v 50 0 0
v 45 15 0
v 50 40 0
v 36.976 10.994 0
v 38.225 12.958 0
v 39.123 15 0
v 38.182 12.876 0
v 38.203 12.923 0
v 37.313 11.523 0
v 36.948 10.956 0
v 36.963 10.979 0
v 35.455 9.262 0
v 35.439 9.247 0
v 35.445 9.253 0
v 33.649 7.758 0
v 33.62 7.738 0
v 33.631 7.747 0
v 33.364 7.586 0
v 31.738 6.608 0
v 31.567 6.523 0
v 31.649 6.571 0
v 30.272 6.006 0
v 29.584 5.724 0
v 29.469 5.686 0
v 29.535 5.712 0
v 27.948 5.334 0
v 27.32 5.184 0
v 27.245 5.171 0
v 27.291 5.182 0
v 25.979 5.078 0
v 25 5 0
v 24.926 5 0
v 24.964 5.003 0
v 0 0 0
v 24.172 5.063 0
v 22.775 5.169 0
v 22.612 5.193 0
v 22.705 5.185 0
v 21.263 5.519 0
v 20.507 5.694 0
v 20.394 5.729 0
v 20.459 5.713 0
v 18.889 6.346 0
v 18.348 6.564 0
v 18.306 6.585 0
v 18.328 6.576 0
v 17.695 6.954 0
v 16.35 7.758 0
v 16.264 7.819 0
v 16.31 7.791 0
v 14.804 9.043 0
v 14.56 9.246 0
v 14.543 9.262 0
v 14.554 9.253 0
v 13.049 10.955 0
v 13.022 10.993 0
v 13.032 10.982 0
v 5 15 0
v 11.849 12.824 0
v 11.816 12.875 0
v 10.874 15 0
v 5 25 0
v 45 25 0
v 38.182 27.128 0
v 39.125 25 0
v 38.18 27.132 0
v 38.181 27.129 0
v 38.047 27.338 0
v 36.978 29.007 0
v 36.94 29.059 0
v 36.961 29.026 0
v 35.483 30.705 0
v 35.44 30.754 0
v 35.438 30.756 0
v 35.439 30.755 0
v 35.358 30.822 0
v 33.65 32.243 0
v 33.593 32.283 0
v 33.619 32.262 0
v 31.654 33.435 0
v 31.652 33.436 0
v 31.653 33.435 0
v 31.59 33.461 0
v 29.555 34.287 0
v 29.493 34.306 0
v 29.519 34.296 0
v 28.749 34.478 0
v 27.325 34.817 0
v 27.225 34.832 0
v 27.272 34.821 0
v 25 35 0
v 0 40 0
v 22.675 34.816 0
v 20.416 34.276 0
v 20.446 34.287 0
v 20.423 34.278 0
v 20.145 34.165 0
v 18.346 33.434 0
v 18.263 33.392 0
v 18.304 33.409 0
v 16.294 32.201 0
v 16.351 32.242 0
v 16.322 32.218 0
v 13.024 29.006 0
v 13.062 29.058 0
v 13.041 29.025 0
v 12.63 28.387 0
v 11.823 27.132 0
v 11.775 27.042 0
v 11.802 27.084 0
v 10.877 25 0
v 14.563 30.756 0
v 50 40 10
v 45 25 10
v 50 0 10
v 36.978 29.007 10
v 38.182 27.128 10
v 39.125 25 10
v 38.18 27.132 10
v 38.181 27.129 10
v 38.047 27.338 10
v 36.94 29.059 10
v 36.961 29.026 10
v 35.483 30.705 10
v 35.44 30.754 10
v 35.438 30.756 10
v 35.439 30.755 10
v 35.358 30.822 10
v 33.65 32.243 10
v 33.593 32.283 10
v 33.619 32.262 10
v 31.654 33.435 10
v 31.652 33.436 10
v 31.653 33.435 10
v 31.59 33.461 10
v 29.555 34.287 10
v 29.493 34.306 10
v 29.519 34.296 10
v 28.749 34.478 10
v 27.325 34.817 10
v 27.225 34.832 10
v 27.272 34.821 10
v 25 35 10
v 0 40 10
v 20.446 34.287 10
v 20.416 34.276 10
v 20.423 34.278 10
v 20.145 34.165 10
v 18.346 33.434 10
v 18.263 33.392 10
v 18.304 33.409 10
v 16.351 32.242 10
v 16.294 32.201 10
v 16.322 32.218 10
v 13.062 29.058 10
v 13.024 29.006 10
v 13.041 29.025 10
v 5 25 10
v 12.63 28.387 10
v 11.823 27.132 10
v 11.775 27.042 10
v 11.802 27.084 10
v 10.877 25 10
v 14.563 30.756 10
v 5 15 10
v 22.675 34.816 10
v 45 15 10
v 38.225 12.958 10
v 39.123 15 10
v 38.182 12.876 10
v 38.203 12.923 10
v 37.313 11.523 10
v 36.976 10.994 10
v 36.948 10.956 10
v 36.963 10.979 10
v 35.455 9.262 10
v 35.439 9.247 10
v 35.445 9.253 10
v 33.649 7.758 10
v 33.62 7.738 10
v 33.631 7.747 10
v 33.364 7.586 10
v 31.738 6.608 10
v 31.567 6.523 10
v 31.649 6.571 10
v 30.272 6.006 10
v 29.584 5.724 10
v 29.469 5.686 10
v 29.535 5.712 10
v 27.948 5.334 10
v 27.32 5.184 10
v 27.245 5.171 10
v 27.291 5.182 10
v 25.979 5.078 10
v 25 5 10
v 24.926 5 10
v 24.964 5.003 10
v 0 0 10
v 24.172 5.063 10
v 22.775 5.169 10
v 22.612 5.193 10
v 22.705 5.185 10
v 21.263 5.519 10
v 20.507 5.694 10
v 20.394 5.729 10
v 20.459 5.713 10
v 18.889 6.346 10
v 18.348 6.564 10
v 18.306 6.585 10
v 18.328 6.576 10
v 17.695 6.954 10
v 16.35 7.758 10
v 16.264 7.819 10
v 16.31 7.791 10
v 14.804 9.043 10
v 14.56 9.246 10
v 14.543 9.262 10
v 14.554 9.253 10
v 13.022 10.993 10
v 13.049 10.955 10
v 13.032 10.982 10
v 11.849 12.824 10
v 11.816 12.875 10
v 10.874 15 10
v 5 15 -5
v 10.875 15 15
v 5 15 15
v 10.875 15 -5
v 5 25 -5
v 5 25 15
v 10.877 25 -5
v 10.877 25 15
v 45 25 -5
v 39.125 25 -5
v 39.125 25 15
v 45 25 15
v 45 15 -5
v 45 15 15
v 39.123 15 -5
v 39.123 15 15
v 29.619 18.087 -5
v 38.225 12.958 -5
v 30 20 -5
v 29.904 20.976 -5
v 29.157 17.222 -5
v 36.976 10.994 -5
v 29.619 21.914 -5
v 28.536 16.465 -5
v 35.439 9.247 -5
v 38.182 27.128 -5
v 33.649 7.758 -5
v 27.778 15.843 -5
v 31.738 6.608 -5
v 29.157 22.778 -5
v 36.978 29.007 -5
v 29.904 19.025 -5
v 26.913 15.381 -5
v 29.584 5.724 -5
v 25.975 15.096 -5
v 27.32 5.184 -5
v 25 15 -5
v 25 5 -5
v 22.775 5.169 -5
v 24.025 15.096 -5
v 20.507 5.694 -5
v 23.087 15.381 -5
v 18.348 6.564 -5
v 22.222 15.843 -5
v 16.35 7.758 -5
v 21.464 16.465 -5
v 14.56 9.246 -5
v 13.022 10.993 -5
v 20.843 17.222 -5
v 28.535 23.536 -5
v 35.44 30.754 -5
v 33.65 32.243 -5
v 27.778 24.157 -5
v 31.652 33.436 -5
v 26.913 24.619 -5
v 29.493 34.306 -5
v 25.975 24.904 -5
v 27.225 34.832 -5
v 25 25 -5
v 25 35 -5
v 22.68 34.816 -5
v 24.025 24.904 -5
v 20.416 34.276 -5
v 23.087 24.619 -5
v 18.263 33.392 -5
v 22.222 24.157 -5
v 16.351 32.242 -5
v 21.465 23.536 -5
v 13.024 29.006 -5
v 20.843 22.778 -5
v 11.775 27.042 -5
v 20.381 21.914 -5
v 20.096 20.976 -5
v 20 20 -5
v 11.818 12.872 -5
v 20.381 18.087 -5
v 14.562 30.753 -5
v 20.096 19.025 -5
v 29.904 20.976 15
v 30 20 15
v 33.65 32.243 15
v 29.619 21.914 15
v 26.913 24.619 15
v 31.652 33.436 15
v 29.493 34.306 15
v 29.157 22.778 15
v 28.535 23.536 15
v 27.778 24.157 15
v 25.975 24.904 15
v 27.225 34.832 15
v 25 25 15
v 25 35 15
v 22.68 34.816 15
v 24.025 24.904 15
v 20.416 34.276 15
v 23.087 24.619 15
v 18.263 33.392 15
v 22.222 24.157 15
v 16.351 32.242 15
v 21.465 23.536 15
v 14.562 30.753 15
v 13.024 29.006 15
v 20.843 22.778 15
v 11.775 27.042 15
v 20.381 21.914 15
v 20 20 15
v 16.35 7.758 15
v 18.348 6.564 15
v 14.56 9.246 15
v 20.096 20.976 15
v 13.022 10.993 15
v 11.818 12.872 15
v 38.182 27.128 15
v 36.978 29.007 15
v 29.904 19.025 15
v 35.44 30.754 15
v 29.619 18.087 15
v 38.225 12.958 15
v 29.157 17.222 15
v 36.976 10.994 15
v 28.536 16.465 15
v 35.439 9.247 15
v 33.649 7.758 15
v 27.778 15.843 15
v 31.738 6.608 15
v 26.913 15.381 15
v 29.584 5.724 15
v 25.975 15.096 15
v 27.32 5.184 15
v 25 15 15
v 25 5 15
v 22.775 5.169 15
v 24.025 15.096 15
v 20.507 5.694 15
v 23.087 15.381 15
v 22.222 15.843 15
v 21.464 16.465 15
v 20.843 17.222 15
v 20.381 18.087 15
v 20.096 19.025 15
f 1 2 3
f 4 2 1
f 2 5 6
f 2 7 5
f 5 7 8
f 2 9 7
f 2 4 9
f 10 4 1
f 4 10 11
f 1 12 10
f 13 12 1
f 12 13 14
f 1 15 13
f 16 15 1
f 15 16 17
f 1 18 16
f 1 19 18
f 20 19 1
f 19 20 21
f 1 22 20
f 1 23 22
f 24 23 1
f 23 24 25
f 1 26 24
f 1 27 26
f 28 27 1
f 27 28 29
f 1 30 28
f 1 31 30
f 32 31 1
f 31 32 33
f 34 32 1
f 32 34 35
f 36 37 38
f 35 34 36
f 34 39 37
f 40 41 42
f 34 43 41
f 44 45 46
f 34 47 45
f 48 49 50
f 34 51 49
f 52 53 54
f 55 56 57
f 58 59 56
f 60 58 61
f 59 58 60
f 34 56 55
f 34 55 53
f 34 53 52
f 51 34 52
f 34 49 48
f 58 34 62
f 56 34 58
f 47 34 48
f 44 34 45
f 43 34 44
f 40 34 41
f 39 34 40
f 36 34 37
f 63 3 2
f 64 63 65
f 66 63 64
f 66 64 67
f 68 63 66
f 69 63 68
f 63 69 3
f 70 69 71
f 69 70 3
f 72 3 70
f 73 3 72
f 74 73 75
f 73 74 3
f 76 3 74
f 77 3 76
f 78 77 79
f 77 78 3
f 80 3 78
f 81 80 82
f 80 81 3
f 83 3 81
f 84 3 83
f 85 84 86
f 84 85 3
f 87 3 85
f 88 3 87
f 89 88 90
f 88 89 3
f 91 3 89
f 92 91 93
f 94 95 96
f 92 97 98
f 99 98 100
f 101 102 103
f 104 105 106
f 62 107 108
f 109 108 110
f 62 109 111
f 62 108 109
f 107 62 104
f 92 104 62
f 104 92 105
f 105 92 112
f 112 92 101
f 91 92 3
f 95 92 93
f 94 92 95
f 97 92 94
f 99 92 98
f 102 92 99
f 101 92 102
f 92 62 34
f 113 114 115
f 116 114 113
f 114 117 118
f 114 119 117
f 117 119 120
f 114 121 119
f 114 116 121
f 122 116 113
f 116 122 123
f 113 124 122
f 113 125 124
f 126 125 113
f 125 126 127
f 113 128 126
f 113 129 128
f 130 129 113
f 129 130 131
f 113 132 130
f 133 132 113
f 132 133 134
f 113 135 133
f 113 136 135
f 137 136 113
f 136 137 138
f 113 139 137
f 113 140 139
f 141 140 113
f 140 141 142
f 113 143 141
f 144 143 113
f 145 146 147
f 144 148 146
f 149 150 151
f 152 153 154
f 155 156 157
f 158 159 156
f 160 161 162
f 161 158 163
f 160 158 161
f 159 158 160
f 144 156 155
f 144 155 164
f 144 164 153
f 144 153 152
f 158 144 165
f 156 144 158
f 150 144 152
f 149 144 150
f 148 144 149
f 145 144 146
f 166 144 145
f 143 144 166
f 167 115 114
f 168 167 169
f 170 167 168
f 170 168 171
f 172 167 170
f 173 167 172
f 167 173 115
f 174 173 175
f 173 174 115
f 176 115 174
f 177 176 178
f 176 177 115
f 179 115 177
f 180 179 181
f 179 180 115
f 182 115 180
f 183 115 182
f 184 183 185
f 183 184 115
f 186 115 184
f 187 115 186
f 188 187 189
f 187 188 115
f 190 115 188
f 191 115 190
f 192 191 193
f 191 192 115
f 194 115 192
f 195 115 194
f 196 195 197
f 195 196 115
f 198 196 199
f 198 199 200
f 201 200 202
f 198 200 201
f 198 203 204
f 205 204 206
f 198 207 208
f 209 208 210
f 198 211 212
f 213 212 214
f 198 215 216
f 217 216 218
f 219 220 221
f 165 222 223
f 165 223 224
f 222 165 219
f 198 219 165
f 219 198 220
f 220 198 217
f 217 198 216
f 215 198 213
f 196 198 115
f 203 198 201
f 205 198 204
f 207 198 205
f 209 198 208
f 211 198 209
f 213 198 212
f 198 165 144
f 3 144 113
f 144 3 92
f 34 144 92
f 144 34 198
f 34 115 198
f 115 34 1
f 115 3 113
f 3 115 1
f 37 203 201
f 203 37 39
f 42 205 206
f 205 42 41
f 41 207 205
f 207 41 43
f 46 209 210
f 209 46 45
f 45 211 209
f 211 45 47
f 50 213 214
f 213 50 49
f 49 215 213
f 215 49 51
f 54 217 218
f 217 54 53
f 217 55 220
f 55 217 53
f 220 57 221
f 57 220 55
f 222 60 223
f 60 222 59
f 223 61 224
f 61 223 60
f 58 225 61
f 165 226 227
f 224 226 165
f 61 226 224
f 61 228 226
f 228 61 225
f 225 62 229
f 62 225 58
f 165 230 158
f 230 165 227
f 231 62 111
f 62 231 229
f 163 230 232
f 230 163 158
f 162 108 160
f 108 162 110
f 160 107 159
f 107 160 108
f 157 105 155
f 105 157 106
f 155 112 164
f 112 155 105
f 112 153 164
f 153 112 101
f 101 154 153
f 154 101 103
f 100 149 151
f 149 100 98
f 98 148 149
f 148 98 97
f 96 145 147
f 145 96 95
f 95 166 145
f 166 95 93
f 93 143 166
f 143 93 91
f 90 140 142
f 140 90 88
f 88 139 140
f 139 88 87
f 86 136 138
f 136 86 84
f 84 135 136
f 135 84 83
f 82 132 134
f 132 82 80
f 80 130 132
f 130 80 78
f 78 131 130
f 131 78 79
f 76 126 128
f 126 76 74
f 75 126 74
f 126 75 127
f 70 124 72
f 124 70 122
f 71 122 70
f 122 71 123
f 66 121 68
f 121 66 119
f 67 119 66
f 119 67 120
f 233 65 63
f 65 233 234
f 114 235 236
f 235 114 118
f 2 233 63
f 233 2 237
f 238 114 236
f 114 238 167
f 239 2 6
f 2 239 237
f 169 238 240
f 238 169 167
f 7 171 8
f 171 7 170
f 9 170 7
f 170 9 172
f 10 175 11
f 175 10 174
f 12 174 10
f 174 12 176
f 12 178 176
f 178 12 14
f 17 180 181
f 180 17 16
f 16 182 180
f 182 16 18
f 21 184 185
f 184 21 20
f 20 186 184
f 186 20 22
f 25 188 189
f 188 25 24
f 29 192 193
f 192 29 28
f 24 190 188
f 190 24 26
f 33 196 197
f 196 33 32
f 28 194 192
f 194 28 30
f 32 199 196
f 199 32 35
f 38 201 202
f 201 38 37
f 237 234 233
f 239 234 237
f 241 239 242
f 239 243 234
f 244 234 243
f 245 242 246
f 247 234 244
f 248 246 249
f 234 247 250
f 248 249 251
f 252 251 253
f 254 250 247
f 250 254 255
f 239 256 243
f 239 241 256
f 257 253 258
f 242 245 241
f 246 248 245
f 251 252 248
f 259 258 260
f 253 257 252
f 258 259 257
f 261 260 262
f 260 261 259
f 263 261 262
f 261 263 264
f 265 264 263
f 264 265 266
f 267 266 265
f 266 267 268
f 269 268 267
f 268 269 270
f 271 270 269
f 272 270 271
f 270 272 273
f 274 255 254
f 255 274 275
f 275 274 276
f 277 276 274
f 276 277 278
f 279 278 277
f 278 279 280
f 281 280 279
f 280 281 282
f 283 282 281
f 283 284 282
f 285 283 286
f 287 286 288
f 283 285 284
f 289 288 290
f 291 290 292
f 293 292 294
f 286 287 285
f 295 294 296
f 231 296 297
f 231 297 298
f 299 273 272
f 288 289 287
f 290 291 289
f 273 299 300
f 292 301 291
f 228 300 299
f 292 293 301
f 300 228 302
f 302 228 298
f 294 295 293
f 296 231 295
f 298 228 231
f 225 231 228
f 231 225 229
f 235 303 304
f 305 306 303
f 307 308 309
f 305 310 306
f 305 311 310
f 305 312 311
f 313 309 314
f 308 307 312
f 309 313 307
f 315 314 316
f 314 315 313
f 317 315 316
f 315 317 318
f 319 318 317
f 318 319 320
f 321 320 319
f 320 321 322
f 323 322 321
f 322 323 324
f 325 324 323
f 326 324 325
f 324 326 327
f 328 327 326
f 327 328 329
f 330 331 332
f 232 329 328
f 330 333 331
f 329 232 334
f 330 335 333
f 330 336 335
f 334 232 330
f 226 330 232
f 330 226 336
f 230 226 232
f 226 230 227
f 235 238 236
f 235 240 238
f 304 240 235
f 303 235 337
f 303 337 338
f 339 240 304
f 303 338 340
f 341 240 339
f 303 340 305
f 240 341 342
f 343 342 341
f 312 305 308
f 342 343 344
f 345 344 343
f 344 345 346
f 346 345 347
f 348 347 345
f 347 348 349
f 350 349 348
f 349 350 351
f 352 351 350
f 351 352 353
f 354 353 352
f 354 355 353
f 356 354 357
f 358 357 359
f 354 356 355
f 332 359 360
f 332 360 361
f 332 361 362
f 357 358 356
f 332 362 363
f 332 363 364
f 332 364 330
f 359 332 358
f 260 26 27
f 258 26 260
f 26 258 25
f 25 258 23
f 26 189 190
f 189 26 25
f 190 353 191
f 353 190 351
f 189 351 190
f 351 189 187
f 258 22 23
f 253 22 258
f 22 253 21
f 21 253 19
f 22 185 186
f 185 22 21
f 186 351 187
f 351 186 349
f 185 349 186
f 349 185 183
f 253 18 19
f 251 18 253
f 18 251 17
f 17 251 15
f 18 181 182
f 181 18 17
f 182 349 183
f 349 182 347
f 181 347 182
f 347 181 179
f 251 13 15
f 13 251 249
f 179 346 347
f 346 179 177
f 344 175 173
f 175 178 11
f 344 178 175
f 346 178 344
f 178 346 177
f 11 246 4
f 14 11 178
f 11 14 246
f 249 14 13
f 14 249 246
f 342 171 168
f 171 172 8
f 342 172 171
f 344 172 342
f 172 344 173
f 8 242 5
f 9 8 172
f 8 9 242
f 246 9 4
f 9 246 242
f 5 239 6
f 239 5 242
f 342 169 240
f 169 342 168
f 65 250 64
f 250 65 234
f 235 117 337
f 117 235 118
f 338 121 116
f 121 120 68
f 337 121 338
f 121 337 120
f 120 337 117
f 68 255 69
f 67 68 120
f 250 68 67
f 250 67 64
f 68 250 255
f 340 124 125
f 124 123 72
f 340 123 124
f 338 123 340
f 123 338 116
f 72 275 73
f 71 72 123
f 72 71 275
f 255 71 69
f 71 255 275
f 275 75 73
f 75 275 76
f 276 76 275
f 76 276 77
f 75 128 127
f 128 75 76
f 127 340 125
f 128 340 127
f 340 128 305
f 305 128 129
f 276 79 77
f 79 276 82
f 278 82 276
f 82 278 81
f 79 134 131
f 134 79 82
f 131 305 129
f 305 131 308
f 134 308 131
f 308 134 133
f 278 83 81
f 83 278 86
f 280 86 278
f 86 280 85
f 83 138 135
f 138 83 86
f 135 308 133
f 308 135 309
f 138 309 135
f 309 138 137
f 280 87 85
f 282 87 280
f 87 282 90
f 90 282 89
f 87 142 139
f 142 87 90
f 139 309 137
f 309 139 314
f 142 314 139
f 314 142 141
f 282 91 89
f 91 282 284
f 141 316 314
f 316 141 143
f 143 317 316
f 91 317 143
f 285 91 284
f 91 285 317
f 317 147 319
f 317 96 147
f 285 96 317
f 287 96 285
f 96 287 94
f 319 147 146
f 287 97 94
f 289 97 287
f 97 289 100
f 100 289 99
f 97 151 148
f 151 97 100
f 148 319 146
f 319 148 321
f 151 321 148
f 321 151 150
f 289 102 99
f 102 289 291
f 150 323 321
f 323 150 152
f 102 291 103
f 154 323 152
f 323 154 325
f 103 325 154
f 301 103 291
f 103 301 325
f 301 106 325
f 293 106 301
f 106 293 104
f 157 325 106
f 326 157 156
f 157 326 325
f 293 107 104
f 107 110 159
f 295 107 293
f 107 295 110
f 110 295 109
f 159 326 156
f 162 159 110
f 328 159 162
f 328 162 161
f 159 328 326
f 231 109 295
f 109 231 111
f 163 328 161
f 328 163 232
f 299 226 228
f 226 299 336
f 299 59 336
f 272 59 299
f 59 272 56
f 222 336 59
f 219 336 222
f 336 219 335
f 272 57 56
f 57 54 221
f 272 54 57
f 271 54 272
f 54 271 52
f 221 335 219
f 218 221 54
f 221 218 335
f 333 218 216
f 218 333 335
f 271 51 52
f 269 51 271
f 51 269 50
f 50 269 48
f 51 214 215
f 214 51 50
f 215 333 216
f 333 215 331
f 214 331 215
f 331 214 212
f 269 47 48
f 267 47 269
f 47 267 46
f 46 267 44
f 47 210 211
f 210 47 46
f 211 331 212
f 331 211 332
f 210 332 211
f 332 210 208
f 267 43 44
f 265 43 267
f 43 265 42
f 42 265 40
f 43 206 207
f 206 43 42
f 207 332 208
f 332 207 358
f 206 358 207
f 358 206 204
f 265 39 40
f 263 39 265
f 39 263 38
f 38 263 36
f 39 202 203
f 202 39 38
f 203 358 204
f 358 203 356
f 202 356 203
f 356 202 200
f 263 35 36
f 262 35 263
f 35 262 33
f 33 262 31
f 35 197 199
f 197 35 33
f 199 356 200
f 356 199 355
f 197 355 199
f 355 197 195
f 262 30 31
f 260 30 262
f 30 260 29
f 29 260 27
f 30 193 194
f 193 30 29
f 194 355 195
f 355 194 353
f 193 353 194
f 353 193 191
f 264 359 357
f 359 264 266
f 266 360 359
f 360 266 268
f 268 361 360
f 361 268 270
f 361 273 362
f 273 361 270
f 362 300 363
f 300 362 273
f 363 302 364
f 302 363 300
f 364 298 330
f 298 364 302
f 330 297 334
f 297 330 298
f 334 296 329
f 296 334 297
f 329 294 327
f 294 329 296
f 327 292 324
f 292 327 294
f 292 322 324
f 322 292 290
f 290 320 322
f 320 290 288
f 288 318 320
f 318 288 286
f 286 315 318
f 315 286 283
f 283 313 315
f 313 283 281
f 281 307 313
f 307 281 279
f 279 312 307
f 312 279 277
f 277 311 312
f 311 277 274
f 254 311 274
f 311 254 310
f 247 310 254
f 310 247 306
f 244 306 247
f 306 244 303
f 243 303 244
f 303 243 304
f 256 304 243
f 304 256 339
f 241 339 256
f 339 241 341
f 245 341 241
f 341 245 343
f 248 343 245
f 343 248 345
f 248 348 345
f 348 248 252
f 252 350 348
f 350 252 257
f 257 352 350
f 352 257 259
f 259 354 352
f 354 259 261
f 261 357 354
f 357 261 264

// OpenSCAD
linear_extrude(10)
polygon(points=[[0,40],[0,0],[50,0],[50,40],[25,35],[27.325,34.817],[29.555,34.287],[31.654,33.435],[33.593,32.283],[35.438,30.756],[36.94,29.059],[38.18,27.132],[39.125,25],[45,25],[45,15],[39.123,15],[38.182,12.876],[36.948,10.956],[35.455,9.262],[33.62,7.738],[31.567,6.523],[29.469,5.686],[27.245,5.171],[24.926,5],[22.612,5.193],[20.394,5.729],[18.306,6.585],[16.264,7.819],[14.543,9.262],[13.049,10.955],[11.816,12.875],[10.874,15],[5,15],[5,25],[10.877,25],[11.823,27.132],[13.062,29.058],[14.563,30.756],[16.294,32.201],[18.346,33.434],[20.446,34.287],[22.675,34.816]],paths=[[0,1,2,3],[4,5,6,7,8,9,10,11,12,13,14,15,16,17,18,19,20,21,22,23,24,25,26,27,28,29,30,31,32,33,34,35,36,37,38,39,40,41]]);
translate([0,-40,-5]) linear_extrude(20)
polygon(points=[[25,75],[22.68,74.816],[20.416,74.276],[18.263,73.392],[16.351,72.242],[14.562,70.753],[13.024,69.006],[11.775,67.042],[10.877,65],[5,65],[5,55],[10.875,55],[11.818,52.872],[13.022,50.993],[14.56,49.246],[16.35,47.758],[18.348,46.564],[20.507,45.694],[22.775,45.169],[25,45],[27.32,45.184],[29.584,45.724],[31.738,46.608],[33.649,47.758],[35.439,49.247],[36.976,50.994],[38.225,52.958],[39.123,55],[45,55],[45,65],[39.125,65],[38.182,67.128],[36.978,69.007],[35.44,70.754],[33.65,72.243],[31.652,73.436],[29.493,74.306],[27.225,74.832],[25,65],[25.975,64.904],[26.913,64.619],[27.778,64.157],[28.535,63.536],[29.157,62.778],[29.619,61.914],[29.904,60.976],[30,60],[29.904,59.025],[29.619,58.087],[29.157,57.222],[28.536,56.465],[27.778,55.843],[26.913,55.381],[25.975,55.096],[25,55],[24.025,55.096],[23.087,55.381],[22.222,55.843],[21.464,56.465],[20.843,57.222],[20.381,58.087],[20.096,59.025],[20,60],[20.096,60.976],[20.381,61.914],[20.843,62.778],[21.465,63.536],[22.222,64.157],[23.087,64.619],[24.025,64.904]],paths=[[0,1,2,3,4,5,6,7,8,9,10,11,12,13,14,15,16,17,18,19,20,21,22,23,24,25,26,27,28,29,30,31,32,33,34,35,36,37],[38,39,40,41,42,43,44,45,46,47,48,49,50,51,52,53,54,55,56,57,58,59,60,61,62,63,64,65,66,67,68,69]]);
